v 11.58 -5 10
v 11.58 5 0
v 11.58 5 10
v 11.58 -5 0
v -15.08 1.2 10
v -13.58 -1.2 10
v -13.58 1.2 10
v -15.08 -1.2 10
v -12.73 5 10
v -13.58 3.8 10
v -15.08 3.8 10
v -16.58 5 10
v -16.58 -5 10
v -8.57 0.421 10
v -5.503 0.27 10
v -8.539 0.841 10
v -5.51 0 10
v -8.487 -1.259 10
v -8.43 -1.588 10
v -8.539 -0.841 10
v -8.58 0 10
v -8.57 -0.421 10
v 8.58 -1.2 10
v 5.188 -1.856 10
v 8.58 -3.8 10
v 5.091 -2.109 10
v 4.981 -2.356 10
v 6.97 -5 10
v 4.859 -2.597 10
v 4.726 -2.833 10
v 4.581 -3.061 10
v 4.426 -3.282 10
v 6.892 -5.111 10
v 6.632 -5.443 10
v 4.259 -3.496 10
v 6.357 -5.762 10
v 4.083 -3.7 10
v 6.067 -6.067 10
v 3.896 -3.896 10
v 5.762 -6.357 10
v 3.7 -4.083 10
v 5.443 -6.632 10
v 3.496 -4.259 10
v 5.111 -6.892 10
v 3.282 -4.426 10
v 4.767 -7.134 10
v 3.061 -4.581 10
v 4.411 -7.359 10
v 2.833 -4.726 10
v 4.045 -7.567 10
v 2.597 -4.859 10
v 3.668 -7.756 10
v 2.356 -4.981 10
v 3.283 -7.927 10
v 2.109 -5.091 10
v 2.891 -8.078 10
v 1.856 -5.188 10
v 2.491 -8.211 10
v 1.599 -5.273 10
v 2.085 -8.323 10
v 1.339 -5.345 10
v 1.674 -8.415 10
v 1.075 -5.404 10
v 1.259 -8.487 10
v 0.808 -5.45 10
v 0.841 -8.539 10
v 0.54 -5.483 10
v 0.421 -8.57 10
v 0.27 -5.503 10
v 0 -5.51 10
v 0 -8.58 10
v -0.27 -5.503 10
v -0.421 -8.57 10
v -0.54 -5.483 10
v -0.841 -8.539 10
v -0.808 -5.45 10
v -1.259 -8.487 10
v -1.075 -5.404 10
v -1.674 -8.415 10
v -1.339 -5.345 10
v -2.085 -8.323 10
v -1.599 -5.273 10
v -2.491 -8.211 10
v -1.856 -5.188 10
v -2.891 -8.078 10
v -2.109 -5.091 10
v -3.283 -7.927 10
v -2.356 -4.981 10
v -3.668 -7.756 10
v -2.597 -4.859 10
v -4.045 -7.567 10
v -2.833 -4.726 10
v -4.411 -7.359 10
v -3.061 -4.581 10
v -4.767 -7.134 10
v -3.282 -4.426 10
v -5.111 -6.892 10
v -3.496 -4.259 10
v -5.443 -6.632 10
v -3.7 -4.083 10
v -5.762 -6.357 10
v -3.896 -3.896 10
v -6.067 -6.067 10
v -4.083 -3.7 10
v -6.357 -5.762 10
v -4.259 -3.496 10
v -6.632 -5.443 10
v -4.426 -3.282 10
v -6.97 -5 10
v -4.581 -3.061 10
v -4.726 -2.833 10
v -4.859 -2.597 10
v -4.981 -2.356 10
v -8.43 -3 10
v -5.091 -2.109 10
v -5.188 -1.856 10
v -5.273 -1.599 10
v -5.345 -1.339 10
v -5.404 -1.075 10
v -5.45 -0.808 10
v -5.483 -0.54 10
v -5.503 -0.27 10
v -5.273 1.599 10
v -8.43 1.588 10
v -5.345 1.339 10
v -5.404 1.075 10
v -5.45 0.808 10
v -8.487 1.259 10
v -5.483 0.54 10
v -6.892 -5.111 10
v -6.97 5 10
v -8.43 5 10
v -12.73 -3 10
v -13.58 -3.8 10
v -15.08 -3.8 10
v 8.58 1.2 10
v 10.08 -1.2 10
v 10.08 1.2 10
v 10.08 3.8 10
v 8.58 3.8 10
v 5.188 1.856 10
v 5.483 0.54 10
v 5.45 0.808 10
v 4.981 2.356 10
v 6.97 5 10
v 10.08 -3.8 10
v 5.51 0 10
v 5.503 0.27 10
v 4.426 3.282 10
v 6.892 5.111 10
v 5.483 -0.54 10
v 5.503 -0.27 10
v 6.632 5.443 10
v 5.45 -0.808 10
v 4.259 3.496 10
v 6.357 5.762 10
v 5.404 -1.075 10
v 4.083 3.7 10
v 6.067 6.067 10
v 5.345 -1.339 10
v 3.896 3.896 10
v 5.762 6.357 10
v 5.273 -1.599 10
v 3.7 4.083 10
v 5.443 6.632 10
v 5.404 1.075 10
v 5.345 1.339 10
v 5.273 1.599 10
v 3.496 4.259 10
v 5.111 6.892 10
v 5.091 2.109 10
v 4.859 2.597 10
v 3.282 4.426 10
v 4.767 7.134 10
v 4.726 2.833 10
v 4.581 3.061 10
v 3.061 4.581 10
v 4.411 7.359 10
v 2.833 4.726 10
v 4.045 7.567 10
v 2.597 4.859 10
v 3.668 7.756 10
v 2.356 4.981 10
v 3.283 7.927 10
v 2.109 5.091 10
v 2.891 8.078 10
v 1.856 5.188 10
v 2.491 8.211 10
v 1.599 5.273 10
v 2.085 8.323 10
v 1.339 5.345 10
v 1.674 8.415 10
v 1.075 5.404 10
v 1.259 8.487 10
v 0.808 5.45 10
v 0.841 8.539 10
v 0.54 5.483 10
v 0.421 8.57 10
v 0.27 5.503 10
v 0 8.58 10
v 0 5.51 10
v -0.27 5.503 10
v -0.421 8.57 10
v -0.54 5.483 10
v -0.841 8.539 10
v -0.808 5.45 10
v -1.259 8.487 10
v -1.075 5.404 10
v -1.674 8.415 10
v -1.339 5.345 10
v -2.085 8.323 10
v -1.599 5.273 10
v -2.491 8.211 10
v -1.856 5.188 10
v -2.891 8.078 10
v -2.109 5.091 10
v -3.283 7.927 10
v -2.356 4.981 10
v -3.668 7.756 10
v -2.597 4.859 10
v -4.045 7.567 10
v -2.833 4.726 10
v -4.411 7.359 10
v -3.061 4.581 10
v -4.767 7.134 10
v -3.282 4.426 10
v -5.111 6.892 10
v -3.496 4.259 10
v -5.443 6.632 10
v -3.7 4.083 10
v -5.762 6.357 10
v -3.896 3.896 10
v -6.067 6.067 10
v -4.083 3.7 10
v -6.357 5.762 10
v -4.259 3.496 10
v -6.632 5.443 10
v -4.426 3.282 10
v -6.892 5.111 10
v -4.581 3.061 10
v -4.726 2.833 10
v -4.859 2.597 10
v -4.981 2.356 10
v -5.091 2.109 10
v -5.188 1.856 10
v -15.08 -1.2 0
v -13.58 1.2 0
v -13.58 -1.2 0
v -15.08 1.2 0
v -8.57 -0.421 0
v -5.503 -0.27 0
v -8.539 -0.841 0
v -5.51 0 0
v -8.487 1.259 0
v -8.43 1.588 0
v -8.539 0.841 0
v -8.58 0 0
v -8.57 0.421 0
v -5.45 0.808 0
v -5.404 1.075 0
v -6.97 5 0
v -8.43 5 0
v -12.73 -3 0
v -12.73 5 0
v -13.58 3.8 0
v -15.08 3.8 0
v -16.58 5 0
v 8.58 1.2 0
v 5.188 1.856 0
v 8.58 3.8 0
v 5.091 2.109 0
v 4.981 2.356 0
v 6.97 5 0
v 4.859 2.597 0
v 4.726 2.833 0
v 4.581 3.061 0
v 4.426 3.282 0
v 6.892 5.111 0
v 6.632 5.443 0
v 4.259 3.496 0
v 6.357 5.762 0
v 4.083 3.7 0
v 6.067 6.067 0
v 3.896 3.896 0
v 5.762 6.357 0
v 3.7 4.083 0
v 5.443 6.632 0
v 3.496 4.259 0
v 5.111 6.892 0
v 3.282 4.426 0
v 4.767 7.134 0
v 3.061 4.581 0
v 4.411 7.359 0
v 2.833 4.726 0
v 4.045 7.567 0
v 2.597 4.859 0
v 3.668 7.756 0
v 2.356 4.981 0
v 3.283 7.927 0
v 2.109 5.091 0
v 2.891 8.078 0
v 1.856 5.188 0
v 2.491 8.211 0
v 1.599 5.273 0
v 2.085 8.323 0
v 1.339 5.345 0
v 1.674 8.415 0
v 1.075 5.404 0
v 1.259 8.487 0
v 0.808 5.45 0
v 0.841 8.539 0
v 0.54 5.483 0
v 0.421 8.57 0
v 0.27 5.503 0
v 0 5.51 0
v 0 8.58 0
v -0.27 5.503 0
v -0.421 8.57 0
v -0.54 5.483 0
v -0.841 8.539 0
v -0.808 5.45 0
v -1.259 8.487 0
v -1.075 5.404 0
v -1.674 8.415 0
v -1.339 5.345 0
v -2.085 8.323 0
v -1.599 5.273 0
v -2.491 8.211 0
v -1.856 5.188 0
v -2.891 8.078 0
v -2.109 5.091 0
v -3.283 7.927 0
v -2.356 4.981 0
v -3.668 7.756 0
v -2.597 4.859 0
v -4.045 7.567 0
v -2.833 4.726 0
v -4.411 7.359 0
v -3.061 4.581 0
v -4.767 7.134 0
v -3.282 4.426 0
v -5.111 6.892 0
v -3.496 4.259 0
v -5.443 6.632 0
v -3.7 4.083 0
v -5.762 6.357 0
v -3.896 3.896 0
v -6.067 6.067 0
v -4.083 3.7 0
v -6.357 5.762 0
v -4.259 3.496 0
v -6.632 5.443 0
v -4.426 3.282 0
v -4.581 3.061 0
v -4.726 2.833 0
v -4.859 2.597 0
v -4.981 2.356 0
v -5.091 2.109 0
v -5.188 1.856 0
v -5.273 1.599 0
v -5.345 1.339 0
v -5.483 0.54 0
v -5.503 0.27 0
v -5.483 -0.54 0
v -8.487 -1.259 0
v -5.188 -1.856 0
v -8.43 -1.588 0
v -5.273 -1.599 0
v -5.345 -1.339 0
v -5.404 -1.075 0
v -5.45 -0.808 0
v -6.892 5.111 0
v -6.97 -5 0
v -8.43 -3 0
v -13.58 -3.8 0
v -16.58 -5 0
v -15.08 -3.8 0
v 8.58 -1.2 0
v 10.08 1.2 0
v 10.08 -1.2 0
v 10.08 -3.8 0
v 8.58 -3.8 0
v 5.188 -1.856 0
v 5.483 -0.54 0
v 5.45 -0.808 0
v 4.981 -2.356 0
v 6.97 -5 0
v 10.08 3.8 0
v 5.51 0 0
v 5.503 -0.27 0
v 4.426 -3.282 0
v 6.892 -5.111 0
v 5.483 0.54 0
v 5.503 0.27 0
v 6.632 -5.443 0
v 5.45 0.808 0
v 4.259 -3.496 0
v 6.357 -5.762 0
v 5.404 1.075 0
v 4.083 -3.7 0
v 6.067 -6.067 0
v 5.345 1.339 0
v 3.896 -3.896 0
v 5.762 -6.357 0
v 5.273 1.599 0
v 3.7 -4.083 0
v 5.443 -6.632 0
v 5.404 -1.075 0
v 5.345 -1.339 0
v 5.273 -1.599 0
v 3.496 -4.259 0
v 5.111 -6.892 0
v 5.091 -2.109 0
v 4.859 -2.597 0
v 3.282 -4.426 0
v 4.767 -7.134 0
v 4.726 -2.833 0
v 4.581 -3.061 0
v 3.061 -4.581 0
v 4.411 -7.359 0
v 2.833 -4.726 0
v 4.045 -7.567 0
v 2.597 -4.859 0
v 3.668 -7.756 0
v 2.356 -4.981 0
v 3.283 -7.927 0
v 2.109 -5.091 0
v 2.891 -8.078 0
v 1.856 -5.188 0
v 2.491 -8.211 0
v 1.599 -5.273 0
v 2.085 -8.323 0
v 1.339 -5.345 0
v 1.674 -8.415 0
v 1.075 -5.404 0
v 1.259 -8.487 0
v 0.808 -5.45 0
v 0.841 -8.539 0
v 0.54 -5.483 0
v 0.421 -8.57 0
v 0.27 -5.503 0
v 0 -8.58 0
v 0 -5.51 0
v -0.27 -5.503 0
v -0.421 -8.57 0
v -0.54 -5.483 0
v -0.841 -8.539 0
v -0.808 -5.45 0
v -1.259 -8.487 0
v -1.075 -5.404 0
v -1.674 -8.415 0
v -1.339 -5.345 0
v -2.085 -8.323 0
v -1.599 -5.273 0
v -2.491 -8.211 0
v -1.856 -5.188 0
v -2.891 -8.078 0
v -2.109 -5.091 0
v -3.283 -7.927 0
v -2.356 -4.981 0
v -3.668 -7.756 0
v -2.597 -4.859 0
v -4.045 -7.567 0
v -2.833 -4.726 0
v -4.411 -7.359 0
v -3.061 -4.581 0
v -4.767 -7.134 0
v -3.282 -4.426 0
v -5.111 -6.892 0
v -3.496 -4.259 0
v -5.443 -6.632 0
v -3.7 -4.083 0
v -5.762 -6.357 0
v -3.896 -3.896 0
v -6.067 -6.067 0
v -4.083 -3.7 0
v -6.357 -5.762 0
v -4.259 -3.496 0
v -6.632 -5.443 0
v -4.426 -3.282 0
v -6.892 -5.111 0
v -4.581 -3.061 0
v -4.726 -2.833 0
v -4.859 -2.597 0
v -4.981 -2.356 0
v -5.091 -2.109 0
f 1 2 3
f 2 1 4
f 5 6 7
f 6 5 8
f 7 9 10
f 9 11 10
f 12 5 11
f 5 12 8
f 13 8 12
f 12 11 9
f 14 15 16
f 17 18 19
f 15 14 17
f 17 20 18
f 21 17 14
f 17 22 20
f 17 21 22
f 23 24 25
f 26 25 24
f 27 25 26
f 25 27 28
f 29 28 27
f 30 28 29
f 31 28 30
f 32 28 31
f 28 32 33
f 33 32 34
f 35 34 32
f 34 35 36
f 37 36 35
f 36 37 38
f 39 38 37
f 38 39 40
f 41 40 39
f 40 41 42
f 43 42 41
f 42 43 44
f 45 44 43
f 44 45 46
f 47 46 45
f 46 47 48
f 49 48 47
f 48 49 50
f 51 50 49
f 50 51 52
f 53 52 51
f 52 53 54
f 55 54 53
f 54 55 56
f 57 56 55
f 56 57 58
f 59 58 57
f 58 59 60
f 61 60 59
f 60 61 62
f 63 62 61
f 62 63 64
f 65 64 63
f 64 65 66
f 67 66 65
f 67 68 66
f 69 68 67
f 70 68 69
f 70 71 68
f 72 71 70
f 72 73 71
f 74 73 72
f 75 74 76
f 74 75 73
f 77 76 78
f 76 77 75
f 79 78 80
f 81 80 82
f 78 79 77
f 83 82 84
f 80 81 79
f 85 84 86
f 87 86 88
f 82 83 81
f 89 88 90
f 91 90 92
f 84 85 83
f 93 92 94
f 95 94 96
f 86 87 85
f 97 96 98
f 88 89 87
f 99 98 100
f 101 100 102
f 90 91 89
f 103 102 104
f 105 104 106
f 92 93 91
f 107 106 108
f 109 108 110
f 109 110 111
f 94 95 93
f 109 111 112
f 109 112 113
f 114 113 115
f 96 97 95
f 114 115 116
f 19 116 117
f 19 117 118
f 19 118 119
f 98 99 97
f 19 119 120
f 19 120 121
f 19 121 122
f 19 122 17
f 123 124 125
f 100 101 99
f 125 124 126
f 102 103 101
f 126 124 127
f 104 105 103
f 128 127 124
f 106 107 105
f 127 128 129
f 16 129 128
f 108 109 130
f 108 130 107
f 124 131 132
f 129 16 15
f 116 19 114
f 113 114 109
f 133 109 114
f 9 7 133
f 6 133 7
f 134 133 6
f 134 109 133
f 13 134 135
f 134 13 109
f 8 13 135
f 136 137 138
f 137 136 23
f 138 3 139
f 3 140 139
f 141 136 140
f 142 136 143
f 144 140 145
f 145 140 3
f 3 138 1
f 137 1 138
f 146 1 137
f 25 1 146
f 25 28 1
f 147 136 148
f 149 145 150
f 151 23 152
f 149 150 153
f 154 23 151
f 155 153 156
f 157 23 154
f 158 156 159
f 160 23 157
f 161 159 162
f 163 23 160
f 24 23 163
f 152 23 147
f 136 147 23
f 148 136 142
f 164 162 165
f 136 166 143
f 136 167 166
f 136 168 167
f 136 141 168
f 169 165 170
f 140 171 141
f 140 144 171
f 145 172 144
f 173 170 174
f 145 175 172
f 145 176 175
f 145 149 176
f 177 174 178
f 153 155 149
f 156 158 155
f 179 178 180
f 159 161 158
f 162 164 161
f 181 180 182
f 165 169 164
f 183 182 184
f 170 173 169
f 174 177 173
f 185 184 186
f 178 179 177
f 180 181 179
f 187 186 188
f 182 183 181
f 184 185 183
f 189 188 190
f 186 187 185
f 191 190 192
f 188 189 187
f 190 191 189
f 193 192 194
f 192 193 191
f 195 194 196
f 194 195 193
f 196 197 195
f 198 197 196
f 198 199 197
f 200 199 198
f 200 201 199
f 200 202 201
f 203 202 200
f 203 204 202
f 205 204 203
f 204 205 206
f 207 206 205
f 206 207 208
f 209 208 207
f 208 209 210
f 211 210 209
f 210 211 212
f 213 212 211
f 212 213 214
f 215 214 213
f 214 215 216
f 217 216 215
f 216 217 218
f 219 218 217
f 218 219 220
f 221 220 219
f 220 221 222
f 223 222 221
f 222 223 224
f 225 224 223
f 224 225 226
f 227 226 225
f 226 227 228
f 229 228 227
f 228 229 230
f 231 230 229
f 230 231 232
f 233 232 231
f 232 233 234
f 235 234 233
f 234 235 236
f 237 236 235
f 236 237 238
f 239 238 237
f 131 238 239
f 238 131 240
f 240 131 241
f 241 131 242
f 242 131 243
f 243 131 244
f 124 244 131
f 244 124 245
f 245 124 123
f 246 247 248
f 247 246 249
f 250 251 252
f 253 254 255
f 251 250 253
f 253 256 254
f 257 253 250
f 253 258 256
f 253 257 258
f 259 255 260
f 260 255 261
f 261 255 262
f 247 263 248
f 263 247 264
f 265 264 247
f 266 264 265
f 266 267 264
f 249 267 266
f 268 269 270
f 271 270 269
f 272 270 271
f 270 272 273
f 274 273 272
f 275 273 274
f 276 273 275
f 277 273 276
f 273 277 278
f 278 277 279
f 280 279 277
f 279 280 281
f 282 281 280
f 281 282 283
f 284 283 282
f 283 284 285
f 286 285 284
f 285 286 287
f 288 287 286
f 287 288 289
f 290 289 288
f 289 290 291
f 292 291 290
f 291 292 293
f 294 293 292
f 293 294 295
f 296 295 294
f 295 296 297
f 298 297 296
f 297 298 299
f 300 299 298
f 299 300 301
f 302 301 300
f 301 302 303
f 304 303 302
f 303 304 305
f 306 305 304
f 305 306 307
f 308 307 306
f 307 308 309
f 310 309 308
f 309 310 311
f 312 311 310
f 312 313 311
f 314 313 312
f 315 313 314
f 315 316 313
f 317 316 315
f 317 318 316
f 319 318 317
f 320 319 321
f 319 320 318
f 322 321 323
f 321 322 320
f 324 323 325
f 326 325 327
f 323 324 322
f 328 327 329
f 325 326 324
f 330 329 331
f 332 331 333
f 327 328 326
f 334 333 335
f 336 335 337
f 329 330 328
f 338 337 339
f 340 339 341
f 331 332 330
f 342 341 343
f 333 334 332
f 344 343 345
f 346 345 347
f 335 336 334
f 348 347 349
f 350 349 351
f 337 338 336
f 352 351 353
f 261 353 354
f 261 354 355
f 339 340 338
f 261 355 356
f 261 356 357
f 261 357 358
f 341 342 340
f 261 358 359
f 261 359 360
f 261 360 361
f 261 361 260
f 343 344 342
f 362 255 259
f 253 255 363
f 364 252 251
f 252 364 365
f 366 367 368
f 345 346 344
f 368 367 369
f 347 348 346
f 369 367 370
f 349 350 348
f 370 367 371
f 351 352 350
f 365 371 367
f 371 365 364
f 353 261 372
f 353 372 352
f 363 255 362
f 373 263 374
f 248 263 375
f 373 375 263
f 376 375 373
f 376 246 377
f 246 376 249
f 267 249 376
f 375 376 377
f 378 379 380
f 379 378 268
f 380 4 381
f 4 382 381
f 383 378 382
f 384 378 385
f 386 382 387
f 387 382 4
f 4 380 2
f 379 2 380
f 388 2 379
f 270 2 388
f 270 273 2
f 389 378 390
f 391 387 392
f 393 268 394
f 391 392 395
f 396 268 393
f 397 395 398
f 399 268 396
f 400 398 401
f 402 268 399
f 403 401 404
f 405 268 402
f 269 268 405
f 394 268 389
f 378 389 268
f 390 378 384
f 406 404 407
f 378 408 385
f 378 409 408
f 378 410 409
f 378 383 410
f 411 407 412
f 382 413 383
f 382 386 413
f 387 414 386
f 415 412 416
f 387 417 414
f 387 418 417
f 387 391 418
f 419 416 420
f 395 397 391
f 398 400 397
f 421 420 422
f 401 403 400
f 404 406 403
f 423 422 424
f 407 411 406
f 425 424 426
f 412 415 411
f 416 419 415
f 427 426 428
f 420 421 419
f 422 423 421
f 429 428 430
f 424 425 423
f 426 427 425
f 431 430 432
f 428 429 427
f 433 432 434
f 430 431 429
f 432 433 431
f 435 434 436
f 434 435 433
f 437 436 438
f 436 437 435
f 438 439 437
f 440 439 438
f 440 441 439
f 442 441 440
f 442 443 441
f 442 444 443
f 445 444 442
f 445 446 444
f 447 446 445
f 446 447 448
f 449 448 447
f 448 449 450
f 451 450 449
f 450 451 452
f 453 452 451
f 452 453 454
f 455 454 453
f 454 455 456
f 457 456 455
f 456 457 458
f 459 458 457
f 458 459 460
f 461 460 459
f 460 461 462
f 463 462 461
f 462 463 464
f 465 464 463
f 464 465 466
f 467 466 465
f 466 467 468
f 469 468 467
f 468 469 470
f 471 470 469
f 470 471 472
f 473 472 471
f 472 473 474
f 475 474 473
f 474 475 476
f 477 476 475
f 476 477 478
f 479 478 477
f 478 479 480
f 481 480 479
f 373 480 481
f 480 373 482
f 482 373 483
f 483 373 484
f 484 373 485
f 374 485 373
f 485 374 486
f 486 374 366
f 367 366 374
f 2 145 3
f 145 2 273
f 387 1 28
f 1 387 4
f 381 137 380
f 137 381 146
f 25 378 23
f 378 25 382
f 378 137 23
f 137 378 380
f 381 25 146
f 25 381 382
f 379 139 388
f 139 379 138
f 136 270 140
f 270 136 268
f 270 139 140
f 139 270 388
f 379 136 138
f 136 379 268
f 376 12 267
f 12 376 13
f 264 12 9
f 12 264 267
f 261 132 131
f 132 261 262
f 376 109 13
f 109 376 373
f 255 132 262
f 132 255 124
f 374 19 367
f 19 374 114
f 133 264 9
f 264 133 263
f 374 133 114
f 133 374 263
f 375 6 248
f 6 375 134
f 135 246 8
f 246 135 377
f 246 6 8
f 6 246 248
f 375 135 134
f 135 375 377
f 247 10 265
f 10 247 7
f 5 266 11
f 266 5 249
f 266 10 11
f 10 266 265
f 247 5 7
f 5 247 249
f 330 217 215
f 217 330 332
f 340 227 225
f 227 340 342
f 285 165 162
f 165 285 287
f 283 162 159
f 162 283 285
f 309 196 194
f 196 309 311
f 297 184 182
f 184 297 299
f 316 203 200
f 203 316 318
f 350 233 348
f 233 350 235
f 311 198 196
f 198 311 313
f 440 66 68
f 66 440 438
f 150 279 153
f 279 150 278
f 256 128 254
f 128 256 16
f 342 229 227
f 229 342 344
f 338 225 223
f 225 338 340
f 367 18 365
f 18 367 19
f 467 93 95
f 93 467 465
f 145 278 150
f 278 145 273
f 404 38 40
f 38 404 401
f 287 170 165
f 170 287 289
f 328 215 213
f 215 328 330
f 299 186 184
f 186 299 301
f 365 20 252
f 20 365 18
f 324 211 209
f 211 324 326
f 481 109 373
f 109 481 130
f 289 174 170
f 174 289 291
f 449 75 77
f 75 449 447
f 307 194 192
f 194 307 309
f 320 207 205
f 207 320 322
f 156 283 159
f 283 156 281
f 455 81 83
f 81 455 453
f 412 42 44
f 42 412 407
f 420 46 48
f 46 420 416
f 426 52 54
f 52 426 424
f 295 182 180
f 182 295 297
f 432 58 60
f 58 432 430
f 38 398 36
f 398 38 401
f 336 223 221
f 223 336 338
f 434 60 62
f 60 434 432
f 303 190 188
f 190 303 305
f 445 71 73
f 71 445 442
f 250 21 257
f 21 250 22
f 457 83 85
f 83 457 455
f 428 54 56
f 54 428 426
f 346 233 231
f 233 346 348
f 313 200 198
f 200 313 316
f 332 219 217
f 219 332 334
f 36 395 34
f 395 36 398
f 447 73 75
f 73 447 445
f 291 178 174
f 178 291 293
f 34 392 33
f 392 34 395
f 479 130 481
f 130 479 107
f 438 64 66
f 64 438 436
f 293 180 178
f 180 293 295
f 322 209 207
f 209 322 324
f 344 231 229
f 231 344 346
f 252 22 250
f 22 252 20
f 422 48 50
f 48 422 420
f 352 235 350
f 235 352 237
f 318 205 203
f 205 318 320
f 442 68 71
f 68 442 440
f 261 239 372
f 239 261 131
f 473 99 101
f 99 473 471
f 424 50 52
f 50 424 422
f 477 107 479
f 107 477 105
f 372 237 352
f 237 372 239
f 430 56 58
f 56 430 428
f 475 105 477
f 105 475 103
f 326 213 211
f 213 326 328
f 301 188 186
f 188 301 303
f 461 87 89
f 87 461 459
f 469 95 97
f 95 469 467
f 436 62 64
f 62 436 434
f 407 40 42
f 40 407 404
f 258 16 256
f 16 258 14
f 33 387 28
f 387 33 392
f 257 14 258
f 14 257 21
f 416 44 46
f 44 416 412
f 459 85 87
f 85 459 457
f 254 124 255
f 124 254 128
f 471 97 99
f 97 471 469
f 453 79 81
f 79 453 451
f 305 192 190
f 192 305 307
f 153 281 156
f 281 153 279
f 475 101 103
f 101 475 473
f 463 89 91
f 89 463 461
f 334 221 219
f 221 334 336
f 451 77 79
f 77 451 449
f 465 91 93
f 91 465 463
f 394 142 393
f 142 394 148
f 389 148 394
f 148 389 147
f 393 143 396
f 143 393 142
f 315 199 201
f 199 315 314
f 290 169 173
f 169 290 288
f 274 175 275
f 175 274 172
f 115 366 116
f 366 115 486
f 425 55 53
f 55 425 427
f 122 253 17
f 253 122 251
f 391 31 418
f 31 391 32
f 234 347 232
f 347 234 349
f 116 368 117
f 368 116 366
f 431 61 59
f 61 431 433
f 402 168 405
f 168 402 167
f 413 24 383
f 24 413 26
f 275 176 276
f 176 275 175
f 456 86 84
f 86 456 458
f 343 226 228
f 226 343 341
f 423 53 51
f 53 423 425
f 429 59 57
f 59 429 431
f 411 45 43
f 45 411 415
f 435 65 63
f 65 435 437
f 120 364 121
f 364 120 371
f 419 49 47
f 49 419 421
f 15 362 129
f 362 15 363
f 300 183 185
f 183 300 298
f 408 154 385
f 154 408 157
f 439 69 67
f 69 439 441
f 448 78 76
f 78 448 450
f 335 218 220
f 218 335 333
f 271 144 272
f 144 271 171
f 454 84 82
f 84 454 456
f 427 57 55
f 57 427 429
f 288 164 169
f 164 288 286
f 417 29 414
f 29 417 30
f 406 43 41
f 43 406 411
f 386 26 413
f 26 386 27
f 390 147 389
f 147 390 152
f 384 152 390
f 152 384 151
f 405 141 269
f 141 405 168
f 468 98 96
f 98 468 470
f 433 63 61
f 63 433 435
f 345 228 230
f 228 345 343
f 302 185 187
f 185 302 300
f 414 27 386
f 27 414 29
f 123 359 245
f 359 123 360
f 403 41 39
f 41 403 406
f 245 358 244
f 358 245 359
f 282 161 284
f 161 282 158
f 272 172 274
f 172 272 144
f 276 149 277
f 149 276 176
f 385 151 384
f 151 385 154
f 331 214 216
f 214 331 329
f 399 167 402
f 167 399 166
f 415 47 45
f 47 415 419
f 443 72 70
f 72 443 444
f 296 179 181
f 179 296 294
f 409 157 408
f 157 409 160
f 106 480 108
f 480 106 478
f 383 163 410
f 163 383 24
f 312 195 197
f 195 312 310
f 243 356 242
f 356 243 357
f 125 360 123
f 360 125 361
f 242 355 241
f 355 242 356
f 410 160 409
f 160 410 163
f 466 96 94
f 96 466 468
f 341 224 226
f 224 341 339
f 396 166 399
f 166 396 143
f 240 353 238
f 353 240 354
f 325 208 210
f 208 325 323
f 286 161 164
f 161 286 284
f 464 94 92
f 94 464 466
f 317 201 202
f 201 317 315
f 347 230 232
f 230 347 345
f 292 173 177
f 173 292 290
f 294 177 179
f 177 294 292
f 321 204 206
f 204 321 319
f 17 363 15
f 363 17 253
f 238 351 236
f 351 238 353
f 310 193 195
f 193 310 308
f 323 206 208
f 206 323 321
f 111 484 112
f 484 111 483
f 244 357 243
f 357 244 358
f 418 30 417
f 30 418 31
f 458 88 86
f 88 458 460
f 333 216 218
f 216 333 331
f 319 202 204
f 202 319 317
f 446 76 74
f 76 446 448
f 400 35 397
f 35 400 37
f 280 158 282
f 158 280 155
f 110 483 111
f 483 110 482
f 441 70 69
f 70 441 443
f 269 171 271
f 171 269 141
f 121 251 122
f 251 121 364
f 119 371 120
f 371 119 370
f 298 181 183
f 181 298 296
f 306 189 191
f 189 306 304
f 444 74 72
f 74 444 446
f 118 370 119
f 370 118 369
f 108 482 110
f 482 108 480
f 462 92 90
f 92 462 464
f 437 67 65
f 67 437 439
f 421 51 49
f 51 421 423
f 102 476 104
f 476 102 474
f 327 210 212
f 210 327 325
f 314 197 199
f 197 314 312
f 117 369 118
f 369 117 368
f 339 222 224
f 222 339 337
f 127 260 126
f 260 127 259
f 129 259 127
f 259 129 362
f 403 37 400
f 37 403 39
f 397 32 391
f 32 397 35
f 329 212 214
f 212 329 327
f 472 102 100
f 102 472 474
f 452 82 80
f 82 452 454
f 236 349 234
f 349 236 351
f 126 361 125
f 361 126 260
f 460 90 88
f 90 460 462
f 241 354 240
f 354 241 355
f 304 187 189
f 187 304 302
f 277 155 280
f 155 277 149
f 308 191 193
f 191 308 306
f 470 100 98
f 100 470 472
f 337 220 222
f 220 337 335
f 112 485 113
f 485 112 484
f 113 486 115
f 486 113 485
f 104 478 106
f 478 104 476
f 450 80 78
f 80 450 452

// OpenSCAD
DOWN_DIAMETER = 13.81;
MIDDLE_DIAMETER = 17.16;
UP_DIAMETER = 11.02;

STRAP_THICKNESS = 1.5;
STRAP_WIDTH = 2.6;

HEIGHT = 10;

$fn = 128;

//holder_down();
//translate([0,20,0])
holder_up();

module slot(height){
    cube_size = 6;
    distance = 2;
    difference(){
        cube([cube_size,cube_size+4,height], true);                
        
        translate([STRAP_THICKNESS/2,-STRAP_THICKNESS-distance/2,0])
        cube([STRAP_THICKNESS,STRAP_WIDTH,height*2], true);
        
        translate([STRAP_THICKNESS/2,STRAP_THICKNESS+distance/2,0])
        cube([STRAP_THICKNESS,STRAP_WIDTH,height*2], true);
    }
}

module hook(height){
    cube_size = 6 + 4;
    distance = 2;
    hook_width = 4.30;

    
    difference(){
        cube([cube_size,cube_size,height], true);                
        
        translate([1,2,0])
        cube([hook_width,cube_size,height*2], true);        
        
        translate([-STRAP_THICKNESS/2-2,-STRAP_THICKNESS-distance/2,0])
        cube([STRAP_THICKNESS,STRAP_WIDTH,height*2], true);
        
        translate([-STRAP_THICKNESS/2-2,STRAP_THICKNESS+distance/2,0])
        cube([STRAP_THICKNESS,STRAP_WIDTH,height*2], true);            
    }    


}

module holder(height, outside_diameter, inside_diameter){;
    translate([0,0,height/2])
    difference(){
        union(){
            cylinder(height,outside_diameter/2, outside_diameter/2, true);  
            translate([outside_diameter/2, 0, 0])       
            slot(height);
            
//            translate([-outside_diameter/2, 0, 0])       
//            rotate([0,180,0])
//            slot(height);

            translate([-outside_diameter/2 - 3, 0, 0])                   
            hook(height);
        }
        cylinder(height*2,inside_diameter/2, inside_diameter/2, true);  
    }    
}

module holder_down(){
    holder(HEIGHT, MIDDLE_DIAMETER, DOWN_DIAMETER);
}

module holder_up(){
    holder(HEIGHT, MIDDLE_DIAMETER, UP_DIAMETER);   
}
